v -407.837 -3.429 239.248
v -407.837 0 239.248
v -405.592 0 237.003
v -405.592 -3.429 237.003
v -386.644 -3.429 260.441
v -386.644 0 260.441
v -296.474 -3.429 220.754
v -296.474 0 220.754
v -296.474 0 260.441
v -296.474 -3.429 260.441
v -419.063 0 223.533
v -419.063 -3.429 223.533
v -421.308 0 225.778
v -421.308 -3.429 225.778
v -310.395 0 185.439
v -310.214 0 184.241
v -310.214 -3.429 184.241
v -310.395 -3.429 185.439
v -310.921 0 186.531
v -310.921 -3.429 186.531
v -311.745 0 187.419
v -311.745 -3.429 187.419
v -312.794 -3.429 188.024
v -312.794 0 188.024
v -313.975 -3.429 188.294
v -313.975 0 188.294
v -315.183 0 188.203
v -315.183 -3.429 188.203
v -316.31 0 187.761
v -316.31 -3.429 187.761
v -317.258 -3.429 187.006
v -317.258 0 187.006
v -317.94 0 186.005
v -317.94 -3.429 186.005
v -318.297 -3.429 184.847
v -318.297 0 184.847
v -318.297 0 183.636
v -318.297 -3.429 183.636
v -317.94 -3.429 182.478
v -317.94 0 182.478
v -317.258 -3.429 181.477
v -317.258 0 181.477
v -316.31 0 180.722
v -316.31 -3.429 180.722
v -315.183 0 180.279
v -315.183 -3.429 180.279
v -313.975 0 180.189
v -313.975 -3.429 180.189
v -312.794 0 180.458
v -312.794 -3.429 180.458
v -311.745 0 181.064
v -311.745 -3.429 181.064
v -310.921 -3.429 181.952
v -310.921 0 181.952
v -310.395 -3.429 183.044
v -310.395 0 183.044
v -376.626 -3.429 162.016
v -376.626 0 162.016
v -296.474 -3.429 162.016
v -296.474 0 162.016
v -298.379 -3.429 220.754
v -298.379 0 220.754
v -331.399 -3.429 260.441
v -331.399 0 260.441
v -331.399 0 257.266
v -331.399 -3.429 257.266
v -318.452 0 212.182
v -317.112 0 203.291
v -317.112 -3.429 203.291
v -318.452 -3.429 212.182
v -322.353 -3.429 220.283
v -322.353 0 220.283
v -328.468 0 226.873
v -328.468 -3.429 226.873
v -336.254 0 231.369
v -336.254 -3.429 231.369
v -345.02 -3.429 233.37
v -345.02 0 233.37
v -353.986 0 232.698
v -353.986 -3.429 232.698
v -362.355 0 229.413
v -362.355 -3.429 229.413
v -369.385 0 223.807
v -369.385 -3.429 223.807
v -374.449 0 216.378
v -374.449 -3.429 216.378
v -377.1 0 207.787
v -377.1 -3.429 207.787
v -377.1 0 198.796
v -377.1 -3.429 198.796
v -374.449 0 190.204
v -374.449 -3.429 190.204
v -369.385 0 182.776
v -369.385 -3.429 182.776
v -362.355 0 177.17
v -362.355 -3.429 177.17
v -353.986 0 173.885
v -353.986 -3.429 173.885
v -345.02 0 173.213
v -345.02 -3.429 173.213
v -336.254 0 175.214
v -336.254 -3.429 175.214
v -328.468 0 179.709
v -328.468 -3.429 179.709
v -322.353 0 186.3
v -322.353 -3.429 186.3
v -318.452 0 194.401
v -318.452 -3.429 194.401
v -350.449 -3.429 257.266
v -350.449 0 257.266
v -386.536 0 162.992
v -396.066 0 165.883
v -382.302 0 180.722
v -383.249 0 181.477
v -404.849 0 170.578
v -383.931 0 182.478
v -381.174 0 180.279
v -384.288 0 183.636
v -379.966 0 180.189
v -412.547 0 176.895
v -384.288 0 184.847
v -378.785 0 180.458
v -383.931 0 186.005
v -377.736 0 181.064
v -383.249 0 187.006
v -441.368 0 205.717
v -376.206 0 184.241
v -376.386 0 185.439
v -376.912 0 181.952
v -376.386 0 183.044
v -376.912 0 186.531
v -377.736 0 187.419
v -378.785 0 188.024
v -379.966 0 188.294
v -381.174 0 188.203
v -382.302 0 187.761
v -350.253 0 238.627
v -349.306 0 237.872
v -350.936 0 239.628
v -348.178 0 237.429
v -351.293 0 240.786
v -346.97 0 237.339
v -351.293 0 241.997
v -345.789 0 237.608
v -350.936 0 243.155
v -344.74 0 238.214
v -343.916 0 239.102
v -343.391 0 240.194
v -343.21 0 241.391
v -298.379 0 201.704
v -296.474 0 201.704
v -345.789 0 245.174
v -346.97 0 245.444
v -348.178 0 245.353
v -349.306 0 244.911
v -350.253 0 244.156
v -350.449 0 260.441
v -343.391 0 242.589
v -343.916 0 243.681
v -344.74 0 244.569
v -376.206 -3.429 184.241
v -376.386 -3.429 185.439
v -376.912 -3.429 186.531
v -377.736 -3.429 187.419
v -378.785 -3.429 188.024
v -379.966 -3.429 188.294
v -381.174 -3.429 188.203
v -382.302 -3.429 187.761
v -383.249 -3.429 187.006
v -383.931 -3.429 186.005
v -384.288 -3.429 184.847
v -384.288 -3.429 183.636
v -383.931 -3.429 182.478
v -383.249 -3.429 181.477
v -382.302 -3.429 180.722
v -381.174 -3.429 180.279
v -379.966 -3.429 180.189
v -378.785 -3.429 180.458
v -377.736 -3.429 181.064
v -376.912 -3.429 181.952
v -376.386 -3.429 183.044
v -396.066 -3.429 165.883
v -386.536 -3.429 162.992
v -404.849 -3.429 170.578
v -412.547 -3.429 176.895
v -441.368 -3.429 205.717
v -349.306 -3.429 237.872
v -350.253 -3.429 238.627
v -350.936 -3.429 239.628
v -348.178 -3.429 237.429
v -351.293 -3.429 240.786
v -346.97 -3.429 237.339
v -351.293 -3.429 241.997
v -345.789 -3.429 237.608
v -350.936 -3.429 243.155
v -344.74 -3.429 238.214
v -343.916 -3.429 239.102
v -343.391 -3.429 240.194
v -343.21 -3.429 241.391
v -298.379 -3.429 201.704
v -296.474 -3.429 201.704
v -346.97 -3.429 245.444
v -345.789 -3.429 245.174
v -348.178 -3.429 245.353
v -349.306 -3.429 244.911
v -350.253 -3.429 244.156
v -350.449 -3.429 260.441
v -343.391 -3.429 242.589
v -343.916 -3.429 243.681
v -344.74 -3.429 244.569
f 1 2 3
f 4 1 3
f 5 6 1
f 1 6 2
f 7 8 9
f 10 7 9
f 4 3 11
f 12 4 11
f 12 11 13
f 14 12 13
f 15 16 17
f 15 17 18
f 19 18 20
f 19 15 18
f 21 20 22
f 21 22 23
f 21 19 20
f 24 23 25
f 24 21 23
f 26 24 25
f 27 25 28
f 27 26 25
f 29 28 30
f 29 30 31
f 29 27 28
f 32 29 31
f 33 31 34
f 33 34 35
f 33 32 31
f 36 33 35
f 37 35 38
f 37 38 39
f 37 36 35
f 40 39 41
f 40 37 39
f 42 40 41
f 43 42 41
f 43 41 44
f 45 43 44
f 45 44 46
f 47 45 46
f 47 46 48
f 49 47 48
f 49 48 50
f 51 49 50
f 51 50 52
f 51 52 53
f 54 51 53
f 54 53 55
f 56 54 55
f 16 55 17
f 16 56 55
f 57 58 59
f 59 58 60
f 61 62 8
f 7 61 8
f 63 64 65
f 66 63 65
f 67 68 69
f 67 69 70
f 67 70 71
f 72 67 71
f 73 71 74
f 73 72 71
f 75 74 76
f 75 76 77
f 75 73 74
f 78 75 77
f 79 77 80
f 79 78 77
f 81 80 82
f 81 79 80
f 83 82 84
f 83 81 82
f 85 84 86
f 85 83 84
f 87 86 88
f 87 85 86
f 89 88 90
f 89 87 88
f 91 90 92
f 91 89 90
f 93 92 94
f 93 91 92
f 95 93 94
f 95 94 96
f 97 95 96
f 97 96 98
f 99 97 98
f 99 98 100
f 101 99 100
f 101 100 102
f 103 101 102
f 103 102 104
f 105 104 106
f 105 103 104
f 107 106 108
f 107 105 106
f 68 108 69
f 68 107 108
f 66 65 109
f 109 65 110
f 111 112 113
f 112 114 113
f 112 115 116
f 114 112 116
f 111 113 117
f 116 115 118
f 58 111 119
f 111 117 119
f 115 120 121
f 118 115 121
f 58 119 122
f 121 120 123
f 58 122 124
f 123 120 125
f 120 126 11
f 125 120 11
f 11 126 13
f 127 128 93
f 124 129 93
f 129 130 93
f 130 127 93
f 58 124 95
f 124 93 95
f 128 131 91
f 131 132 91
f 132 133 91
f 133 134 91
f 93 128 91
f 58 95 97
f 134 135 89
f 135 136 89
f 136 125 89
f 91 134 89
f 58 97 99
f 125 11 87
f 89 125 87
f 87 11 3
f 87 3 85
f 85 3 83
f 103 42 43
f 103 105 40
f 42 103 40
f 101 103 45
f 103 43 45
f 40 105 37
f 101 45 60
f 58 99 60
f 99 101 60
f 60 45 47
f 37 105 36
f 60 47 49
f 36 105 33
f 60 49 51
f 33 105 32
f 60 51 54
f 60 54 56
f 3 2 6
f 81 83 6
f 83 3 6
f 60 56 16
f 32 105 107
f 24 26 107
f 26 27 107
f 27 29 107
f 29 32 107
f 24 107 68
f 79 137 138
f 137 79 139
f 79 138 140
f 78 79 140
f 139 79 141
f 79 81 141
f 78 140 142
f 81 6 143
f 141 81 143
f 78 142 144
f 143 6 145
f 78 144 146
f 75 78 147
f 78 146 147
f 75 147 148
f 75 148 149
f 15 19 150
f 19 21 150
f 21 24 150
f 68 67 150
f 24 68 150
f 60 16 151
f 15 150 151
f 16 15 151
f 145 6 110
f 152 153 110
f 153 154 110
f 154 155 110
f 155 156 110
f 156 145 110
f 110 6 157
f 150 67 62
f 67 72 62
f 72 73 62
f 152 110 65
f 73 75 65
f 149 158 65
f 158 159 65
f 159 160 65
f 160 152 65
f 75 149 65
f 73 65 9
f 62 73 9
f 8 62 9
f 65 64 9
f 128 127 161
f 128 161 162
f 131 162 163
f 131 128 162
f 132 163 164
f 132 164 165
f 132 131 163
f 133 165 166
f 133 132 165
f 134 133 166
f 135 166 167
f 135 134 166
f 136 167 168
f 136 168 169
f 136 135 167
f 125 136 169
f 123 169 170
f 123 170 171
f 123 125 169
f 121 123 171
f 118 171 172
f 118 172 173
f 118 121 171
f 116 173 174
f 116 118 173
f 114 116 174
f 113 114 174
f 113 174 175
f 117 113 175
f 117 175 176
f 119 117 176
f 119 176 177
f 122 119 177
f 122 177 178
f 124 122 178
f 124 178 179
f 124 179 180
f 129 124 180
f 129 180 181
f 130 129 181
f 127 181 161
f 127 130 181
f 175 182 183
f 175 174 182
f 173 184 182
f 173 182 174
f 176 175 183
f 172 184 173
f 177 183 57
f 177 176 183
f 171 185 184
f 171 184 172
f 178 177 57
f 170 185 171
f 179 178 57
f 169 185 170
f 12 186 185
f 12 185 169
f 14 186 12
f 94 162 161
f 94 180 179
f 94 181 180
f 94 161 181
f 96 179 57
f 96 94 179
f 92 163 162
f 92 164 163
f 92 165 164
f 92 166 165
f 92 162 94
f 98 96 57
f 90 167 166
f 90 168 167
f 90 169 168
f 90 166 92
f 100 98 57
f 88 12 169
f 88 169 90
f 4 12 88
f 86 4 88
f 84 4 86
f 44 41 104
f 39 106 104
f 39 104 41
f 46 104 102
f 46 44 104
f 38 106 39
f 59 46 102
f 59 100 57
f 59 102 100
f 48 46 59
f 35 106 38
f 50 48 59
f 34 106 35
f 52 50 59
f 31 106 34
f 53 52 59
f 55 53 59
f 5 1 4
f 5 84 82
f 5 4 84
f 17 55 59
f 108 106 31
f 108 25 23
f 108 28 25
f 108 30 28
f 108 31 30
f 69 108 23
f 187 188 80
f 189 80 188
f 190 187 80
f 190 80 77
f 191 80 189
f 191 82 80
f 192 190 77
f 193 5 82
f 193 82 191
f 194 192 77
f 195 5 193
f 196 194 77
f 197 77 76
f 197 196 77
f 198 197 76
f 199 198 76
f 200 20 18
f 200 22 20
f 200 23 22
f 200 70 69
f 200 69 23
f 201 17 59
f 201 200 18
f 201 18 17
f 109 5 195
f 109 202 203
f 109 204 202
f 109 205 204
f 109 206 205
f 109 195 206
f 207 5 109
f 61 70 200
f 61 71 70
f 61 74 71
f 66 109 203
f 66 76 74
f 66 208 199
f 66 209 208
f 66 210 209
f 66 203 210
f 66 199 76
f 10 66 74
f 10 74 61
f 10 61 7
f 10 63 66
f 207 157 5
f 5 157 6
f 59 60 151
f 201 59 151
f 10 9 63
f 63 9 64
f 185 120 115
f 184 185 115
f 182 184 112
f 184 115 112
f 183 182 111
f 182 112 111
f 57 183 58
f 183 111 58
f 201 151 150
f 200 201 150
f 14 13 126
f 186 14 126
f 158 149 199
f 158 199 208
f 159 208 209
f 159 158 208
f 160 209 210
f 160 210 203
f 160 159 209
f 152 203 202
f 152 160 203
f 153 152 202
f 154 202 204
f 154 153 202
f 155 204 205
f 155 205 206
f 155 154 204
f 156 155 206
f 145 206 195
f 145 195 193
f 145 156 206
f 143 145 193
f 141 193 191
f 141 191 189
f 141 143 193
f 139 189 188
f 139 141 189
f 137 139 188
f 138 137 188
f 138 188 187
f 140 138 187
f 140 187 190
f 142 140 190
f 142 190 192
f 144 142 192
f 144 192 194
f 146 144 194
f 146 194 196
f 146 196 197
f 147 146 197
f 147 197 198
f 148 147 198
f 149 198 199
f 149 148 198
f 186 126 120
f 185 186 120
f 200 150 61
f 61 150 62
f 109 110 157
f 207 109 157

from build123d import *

# Parameters (mm, degrees)
F0_R     = 4.064
F0_R_2   = 30.1625
F1_DEPTH = 3.429


# Not quite as in the source:
# - ends of sketch curves that miss each other by under 0.0002 mm in the source are joined


with BuildPart() as f1:
    # F0 (on Front) → F1 (new body)
    with BuildSketch(Plane.XZ):
        with BuildLine():
            Line((-405.5923562, 237.0029296), (-419.0627382, 223.5325476))
            Line((-419.0627382, 223.5325476), (-421.3077934, 225.7776028))
            Line((-421.3077934, 225.7776028), (-441.368434, 205.7169622))
            Line((-441.368434, 205.7169622), (-412.5468254, 176.895379))
            ThreePointArc((-412.5468254, 176.895379), (-396.0661335641, 165.8833089484), (-376.6258152, 162.0163892))
            Line((-376.6258152, 162.0163892), (-296.474007, 162.0163892))
            Line((-296.474007, 162.0163892), (-296.474007, 201.7038892))
            Line((-296.474007, 201.7038892), (-298.379007, 201.7038892))
            Line((-298.379007, 201.7038892), (-298.379007, 220.7538892))
            Line((-298.379007, 220.7538892), (-296.474007, 220.7538892))
            Line((-296.474007, 220.7538892), (-296.474007, 260.4413892))
            Line((-296.474007, 260.4413892), (-331.399007, 260.4413892))
            Line((-331.399007, 260.4413892), (-331.399007, 257.2663892))
            Line((-331.399007, 257.2663892), (-350.449007, 257.2663892))
            Line((-350.449007, 257.2663892), (-350.449007, 260.4413892))
            Line((-350.449007, 260.4413892), (-386.644007, 260.4413892))
            Line((-386.644007, 260.4413892), (-407.8374114, 239.2479848))
            Line((-407.8374114, 239.2479848), (-405.5923562, 237.0029296))
        make_face()
        with Locations((-380.2695722, 184.2413892)):
            Circle(F0_R, mode=Mode.SUBTRACT)
        with Locations((-314.2784418, 184.2413892)):
            Circle(F0_R, mode=Mode.SUBTRACT)
        with Locations((-347.274007, 203.2913892)):
            Circle(F0_R_2, mode=Mode.SUBTRACT)
        with Locations((-347.274007, 241.3913892)):
            Circle(F0_R, mode=Mode.SUBTRACT)
    extrude(amount=F1_DEPTH)


solid = f1.part
